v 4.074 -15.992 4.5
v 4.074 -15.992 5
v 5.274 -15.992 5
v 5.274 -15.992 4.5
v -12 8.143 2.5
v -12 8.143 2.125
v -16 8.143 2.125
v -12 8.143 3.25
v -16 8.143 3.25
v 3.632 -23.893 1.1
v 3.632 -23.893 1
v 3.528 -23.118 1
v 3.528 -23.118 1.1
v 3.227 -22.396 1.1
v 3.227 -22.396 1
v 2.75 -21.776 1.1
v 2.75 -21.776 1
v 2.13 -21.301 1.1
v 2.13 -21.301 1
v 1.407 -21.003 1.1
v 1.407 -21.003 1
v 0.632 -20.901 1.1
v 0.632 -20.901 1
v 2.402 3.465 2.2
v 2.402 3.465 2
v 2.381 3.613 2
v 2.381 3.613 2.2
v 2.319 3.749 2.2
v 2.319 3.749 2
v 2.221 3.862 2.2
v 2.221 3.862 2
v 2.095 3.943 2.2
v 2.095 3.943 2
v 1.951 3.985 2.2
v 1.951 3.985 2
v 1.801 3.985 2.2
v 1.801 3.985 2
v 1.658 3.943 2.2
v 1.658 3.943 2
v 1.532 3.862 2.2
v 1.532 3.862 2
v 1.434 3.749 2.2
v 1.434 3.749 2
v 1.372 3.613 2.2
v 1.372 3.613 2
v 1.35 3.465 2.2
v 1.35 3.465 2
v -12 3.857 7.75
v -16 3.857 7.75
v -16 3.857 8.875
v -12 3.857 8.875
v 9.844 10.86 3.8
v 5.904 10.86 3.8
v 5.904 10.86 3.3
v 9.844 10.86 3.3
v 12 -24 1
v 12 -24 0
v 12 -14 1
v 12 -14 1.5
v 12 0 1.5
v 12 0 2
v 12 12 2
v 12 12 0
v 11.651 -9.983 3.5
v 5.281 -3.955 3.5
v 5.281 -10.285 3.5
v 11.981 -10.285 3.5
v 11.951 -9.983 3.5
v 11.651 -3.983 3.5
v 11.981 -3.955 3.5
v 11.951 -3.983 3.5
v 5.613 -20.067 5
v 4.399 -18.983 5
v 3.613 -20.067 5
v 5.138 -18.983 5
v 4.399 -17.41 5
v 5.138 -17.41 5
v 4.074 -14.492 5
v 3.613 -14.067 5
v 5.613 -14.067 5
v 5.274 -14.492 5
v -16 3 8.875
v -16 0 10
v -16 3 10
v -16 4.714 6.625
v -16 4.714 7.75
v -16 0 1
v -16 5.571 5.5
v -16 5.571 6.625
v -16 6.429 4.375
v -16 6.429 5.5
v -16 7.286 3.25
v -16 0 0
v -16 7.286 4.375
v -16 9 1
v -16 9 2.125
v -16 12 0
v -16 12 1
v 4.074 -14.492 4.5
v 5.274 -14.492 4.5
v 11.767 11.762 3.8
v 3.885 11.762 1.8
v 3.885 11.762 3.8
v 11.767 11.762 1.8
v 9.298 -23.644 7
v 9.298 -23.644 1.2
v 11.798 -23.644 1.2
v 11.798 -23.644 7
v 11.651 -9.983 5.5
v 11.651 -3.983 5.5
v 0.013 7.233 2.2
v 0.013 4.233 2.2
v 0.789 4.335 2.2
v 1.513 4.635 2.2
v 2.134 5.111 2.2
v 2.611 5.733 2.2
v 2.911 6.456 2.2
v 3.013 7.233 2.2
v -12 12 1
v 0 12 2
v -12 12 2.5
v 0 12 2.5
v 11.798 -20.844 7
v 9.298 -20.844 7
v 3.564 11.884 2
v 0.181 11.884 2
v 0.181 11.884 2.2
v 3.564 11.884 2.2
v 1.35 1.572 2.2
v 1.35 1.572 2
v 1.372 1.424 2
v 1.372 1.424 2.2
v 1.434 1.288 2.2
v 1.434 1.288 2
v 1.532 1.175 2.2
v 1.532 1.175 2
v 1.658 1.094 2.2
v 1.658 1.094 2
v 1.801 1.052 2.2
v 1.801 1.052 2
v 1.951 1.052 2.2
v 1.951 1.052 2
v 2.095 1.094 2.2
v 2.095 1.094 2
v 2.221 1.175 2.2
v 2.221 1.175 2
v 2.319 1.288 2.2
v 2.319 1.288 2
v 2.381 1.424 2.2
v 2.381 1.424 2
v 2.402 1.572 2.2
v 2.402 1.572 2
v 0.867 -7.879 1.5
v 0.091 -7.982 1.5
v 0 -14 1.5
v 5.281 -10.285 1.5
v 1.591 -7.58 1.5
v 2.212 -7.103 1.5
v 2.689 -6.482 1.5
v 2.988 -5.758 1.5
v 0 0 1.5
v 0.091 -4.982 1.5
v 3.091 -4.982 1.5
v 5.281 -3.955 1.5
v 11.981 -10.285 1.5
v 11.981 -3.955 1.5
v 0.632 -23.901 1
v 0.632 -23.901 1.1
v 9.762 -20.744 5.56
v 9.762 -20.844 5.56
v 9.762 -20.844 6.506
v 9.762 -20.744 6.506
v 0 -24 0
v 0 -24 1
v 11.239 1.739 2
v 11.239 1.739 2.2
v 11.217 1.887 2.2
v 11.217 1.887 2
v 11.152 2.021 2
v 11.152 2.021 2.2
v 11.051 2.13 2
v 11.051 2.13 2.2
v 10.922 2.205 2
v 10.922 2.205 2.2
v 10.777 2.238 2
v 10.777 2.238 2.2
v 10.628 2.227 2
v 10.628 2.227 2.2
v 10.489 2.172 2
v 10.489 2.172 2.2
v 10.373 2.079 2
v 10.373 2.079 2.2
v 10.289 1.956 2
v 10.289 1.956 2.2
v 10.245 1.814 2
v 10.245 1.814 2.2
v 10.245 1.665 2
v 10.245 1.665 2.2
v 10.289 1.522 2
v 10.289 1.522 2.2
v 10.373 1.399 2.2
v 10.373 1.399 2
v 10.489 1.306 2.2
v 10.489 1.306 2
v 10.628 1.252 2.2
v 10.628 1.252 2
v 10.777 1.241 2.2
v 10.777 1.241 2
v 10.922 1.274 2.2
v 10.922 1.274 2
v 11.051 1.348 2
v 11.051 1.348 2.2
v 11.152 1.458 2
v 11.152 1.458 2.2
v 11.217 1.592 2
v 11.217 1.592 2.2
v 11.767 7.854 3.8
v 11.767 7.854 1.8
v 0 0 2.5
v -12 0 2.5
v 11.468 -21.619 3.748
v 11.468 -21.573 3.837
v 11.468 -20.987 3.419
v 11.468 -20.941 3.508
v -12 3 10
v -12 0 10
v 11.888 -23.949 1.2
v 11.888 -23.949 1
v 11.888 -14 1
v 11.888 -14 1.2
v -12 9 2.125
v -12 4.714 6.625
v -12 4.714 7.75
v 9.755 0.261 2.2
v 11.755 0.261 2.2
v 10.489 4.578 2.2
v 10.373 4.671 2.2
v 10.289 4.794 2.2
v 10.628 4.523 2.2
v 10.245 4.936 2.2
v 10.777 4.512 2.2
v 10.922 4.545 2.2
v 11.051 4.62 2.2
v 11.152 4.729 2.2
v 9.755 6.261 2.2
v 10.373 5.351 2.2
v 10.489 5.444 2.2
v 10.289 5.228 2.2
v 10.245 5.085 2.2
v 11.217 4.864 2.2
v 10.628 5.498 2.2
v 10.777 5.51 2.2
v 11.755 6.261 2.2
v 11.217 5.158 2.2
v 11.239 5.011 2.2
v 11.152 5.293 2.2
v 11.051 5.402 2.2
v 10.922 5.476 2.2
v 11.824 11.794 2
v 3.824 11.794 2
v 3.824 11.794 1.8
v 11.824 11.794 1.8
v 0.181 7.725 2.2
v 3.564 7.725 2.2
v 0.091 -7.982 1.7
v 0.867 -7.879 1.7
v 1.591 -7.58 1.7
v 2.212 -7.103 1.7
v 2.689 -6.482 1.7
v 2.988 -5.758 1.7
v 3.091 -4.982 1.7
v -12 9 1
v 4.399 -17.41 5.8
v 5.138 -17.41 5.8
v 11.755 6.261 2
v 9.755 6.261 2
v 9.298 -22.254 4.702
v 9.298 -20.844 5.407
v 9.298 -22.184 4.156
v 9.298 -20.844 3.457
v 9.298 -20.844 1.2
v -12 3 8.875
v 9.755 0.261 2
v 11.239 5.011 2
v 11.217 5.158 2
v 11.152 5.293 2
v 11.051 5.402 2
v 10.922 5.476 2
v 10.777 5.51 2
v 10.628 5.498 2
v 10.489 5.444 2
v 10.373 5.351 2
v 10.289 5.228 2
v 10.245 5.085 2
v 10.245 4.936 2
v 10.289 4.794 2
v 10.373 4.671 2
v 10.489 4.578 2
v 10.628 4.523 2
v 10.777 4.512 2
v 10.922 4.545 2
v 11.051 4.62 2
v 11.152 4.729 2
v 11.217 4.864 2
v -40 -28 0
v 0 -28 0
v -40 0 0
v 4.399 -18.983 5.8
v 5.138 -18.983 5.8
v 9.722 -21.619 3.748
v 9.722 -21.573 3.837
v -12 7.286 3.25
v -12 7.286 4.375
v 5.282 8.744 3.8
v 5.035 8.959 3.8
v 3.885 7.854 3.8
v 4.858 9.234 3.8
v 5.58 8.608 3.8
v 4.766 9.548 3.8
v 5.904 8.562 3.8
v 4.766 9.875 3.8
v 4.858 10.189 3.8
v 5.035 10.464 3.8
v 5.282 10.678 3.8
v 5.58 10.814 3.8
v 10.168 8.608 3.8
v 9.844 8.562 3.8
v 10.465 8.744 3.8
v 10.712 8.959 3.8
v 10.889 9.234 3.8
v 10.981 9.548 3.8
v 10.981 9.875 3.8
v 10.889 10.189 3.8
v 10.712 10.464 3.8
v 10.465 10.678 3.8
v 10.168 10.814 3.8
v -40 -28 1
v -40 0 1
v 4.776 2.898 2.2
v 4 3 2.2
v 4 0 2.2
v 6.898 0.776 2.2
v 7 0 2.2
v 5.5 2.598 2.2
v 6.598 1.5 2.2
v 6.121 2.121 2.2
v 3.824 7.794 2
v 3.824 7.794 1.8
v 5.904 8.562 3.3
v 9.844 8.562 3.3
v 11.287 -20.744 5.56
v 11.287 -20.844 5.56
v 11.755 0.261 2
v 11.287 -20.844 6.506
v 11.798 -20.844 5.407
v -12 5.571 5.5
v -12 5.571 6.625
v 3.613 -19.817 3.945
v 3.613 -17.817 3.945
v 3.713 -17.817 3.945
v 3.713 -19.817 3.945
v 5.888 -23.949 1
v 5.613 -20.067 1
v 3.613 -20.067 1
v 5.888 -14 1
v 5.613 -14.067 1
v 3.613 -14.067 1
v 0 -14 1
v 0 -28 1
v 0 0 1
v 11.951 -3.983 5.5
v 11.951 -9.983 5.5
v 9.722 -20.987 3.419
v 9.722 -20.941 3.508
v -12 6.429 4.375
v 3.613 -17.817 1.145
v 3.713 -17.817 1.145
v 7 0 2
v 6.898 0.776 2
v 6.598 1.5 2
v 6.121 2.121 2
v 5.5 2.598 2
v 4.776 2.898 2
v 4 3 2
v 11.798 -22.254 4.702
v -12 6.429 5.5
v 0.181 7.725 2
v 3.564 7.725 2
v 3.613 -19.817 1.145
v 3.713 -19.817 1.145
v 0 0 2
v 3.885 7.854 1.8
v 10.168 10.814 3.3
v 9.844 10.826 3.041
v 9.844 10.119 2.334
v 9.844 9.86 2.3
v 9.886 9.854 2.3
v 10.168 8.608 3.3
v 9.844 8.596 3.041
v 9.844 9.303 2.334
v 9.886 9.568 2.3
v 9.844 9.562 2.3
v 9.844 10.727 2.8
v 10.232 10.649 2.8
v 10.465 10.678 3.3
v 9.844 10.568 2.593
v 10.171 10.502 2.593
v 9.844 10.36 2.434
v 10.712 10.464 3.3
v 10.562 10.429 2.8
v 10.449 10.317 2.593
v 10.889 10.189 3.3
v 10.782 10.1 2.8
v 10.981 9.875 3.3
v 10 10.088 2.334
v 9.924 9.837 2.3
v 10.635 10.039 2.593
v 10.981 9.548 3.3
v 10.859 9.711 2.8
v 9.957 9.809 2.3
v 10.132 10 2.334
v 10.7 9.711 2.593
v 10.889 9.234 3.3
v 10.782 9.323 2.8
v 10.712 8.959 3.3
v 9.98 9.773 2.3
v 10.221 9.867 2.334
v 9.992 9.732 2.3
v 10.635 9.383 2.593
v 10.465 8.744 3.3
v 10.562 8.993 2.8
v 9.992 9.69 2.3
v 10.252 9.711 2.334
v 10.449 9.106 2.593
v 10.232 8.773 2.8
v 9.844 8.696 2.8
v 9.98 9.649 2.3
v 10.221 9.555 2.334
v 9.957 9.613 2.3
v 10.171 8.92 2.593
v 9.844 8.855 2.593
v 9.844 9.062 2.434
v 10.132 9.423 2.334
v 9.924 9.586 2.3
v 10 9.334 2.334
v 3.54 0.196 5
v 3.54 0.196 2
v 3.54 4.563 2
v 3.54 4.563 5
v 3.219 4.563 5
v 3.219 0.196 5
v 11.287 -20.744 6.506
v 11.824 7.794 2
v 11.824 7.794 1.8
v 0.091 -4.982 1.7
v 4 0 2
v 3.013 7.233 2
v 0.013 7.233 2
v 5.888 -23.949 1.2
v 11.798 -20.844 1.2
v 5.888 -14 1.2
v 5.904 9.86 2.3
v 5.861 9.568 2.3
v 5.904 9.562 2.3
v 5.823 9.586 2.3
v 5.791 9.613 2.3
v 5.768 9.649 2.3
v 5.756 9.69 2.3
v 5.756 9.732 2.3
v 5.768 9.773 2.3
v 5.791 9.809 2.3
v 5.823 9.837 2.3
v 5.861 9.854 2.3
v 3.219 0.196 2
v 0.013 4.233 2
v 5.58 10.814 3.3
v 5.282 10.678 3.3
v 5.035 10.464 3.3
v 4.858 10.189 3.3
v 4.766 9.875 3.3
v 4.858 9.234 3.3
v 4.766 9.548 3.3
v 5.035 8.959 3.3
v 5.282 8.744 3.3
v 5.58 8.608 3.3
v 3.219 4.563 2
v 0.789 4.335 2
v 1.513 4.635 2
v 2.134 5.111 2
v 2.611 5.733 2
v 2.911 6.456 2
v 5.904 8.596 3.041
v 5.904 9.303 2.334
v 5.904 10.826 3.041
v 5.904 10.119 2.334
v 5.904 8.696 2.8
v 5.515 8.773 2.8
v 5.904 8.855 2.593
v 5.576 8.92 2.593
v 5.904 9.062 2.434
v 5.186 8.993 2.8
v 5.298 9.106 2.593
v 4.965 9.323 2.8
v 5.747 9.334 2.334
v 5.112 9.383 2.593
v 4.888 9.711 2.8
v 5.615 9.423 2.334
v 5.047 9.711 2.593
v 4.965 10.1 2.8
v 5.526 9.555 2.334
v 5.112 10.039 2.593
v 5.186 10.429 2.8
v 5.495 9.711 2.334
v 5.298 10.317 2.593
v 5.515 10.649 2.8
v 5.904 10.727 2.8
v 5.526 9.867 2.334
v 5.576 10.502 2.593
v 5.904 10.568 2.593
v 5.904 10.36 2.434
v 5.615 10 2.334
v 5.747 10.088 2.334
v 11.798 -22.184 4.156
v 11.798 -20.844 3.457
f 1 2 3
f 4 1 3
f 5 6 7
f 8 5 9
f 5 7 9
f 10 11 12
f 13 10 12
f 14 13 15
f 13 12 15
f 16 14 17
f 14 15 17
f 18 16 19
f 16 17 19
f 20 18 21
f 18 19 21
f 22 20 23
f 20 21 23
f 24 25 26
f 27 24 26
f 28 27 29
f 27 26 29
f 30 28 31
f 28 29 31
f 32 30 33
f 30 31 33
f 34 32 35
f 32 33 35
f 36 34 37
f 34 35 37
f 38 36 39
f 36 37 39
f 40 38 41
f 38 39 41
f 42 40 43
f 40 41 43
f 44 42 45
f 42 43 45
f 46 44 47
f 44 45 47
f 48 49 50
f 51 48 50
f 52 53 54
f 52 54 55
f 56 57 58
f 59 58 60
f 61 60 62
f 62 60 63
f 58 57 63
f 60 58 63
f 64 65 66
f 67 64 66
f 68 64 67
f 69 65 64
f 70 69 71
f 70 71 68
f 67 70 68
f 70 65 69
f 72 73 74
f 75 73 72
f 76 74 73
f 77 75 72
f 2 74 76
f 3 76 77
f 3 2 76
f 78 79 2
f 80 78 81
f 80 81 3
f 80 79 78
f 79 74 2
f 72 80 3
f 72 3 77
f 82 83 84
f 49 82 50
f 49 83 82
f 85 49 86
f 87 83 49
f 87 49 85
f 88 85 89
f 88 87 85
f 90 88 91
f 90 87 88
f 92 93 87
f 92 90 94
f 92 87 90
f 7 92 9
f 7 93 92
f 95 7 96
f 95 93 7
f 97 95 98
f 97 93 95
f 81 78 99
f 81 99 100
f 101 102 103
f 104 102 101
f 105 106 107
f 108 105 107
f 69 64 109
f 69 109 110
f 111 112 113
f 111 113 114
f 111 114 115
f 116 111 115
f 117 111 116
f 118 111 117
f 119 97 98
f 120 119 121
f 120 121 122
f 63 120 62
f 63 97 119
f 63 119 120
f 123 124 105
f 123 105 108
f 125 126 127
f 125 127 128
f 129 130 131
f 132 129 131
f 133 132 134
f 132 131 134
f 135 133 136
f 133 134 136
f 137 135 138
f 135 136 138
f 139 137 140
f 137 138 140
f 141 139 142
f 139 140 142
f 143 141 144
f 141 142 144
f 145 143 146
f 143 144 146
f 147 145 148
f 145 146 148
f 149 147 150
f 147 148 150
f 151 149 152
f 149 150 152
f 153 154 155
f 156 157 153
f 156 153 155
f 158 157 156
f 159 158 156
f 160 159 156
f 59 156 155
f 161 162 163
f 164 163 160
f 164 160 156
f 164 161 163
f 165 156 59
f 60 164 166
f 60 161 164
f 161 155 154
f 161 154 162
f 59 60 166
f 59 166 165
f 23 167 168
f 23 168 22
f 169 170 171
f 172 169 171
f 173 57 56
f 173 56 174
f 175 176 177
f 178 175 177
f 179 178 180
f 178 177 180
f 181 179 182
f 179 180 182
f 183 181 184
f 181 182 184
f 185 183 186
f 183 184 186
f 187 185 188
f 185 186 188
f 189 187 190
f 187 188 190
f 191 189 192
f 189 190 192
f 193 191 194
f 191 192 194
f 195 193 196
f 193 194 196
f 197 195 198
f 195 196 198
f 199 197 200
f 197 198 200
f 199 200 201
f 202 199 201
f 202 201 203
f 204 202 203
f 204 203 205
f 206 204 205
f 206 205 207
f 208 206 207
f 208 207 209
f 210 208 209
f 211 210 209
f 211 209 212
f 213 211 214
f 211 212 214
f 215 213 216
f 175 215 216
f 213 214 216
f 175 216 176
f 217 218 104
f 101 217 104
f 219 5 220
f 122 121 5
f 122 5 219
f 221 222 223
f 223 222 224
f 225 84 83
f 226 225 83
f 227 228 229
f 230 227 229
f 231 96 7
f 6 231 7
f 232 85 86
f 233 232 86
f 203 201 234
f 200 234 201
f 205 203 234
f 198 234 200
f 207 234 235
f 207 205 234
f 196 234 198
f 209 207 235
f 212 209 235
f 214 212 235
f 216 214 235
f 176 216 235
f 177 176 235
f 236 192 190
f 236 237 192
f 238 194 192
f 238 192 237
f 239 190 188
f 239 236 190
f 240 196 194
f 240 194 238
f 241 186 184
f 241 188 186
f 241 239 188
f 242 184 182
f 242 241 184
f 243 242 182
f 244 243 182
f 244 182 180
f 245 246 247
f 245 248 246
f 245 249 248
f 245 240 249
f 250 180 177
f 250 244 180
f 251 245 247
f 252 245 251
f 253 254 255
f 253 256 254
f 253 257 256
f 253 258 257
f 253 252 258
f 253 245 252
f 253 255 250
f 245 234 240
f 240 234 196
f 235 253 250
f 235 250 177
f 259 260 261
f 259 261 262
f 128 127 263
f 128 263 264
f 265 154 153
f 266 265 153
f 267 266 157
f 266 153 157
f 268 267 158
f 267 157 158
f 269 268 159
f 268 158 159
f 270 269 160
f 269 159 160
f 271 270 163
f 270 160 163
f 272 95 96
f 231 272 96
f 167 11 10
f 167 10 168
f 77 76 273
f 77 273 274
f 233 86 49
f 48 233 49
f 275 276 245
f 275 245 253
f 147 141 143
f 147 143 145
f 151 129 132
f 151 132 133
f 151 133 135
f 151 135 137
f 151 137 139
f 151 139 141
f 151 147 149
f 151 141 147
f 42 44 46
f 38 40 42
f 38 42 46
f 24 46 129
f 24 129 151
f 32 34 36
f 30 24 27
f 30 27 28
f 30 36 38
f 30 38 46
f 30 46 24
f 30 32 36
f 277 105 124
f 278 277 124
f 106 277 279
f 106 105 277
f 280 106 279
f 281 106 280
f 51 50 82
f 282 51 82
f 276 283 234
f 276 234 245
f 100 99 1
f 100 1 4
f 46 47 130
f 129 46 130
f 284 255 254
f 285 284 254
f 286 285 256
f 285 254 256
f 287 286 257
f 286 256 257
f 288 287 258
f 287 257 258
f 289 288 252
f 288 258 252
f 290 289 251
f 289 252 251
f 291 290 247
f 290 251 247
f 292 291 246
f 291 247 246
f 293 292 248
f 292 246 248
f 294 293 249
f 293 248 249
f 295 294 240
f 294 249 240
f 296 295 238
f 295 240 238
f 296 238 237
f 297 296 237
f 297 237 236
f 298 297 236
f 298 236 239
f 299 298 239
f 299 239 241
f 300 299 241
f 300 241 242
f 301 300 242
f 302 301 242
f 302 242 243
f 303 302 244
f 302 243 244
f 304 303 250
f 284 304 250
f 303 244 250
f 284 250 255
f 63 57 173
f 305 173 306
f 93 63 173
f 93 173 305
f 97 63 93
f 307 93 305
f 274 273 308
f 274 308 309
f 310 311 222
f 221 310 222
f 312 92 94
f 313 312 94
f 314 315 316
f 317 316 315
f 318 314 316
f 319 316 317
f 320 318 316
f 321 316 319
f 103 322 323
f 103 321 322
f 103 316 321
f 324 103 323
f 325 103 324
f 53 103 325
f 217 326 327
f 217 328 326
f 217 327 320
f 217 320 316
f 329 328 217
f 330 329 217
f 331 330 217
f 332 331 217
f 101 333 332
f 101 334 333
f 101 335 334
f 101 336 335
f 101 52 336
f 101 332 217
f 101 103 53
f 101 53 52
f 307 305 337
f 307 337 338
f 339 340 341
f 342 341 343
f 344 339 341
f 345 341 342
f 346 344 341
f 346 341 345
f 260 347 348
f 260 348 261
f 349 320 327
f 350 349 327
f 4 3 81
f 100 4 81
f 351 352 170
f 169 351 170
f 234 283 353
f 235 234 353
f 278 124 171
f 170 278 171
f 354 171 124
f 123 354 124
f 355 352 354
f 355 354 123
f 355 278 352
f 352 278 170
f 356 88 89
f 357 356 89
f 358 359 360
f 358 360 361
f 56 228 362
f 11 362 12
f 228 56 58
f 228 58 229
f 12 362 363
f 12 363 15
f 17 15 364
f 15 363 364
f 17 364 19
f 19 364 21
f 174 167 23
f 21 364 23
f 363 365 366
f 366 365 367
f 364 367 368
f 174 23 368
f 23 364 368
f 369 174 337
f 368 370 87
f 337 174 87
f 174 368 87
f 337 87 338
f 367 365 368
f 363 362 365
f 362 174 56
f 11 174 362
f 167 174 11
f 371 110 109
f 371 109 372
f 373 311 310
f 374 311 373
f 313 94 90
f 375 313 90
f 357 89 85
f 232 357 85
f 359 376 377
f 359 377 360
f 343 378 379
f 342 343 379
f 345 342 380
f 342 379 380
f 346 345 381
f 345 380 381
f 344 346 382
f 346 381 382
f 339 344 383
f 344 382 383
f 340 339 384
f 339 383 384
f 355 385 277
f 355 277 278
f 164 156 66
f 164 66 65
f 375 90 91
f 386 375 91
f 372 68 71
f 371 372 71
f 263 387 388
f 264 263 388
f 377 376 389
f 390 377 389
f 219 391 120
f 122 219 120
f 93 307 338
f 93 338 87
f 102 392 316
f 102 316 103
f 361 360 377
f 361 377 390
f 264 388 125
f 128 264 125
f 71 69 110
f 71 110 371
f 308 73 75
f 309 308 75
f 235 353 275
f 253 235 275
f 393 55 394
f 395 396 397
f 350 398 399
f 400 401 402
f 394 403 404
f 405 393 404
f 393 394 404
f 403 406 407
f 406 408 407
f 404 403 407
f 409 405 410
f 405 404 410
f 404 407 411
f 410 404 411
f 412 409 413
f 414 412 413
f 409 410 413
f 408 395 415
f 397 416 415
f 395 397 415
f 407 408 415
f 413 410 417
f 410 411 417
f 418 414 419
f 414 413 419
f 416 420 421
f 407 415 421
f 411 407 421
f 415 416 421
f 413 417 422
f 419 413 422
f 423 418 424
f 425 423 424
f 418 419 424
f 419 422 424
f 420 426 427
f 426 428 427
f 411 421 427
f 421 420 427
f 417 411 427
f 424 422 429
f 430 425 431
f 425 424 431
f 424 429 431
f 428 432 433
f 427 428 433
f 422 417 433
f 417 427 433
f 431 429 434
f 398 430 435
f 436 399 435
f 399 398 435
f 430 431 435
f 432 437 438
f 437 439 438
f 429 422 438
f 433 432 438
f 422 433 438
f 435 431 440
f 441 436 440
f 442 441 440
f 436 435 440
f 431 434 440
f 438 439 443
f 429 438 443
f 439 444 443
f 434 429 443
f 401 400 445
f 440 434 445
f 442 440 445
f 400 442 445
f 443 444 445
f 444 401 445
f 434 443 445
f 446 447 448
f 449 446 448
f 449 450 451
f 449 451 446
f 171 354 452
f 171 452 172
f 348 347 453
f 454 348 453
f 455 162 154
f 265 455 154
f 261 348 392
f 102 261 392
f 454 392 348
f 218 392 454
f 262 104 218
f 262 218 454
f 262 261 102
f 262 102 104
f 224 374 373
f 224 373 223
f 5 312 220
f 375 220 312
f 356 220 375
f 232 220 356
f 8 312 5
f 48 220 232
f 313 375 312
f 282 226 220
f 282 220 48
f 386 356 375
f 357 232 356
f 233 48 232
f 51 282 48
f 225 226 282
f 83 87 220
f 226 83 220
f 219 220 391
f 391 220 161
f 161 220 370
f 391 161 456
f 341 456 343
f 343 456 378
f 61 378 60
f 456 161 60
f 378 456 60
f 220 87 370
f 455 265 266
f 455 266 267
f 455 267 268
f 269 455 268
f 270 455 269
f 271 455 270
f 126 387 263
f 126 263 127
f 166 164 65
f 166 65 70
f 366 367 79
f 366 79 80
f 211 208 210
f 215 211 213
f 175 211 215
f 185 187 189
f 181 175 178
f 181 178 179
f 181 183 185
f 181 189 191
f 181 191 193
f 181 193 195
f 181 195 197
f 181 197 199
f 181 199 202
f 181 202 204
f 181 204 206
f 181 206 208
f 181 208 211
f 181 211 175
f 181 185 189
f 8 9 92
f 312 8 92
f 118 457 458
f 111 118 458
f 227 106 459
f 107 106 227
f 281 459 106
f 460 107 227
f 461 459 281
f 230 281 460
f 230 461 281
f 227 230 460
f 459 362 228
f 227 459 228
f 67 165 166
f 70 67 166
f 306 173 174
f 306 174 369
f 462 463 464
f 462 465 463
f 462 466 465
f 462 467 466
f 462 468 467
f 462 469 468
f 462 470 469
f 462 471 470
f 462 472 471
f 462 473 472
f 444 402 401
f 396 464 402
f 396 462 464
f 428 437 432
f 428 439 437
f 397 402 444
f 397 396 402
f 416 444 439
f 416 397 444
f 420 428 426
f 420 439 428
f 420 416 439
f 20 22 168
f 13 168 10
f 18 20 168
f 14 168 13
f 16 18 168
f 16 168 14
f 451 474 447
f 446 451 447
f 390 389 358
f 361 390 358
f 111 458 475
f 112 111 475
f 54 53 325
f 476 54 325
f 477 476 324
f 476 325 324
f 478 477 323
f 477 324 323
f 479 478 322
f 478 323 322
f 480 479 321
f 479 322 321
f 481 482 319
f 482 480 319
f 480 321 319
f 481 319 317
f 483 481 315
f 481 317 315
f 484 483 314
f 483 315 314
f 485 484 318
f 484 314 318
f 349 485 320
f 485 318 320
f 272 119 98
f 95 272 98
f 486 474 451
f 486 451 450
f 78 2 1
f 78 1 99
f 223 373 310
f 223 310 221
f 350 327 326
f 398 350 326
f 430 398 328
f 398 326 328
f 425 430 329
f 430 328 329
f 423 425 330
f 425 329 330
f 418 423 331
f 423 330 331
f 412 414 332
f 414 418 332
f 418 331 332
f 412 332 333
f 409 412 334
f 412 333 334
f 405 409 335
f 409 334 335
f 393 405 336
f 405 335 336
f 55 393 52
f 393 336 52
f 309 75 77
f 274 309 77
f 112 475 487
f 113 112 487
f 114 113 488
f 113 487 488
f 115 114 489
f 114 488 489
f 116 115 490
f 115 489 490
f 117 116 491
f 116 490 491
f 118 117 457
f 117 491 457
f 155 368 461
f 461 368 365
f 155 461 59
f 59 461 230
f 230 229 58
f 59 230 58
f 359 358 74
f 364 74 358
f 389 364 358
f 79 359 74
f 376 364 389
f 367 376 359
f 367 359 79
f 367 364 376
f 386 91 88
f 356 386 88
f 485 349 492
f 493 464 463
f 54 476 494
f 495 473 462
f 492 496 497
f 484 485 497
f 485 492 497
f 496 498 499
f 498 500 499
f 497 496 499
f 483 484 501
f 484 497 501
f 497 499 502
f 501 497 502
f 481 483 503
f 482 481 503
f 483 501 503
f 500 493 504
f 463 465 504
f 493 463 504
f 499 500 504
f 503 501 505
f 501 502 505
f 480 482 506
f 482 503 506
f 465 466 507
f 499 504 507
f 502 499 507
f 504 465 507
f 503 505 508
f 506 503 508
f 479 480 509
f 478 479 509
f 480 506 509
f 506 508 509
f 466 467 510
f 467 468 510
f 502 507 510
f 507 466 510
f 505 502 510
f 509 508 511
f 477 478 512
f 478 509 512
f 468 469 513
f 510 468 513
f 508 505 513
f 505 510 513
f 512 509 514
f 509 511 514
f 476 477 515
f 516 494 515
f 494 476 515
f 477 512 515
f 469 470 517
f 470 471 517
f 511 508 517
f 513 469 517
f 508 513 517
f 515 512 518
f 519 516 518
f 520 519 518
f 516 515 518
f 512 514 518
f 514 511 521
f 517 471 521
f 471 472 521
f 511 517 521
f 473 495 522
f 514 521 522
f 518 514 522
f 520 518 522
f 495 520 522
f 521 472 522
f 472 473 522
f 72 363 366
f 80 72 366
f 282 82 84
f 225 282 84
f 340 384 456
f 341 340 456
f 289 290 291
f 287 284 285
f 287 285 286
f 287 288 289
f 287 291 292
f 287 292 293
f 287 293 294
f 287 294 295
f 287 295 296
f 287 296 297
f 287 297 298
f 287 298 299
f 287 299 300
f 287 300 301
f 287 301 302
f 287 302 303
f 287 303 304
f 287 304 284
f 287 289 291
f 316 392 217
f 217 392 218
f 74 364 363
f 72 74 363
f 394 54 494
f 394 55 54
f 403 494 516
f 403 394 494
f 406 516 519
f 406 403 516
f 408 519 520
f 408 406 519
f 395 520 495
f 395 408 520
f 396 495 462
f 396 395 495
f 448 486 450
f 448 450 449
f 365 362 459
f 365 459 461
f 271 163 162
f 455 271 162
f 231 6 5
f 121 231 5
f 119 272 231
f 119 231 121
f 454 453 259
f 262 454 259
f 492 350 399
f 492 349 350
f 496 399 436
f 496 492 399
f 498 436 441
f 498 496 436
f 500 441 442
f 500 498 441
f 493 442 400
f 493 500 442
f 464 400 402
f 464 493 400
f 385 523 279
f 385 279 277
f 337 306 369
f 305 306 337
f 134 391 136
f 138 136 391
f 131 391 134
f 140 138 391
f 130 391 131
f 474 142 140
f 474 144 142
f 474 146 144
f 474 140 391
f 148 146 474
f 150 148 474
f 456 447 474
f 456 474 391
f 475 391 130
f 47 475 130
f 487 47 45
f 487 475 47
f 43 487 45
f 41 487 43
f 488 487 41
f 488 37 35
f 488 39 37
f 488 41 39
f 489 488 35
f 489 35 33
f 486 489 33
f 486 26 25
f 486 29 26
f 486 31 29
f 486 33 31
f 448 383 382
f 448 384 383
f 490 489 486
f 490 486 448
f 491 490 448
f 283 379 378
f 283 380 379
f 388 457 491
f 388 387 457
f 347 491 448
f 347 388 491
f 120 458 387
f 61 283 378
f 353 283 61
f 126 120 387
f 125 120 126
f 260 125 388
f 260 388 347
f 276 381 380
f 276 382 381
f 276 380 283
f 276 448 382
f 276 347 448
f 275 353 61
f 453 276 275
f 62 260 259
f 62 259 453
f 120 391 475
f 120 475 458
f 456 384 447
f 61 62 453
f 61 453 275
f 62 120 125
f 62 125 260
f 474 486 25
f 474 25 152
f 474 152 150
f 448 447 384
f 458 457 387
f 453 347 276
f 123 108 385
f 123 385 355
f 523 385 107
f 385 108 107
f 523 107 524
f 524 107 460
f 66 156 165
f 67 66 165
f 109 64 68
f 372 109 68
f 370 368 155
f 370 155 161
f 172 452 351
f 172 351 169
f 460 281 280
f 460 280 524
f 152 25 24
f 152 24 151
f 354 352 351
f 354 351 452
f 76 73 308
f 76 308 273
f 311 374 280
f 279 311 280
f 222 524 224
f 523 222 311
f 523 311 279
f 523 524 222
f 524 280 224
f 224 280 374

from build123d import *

# Parameters (mm, degrees)
PAD_DEPTH       = 1
SKETCH001_W     = 12
SKETCH001_H     = 12
PAD001_DEPTH    = 1
SKETCH002_W     = 12
SKETCH002_H     = 14
PAD002_DEPTH    = 0.5
SKETCH003_W     = 12
SKETCH003_H     = 12
PAD003_DEPTH    = 1.5
PAD004_DEPTH    = 4
SKETCH005_W     = 8
SKETCH005_H     = 4
POCKET_DEPTH    = 0.2
PAD005_DEPTH    = 0.2
SKETCH007_W     = 2
SKETCH007_H     = 6
PAD006_DEPTH    = 0.2
SKETCH008_R     = 0.5
POCKET001_DEPTH = 0.2
SKETCH009_W     = 3.383523
SKETCH009_H     = 4.158913
PAD007_DEPTH    = 0.2
PAD008_DEPTH    = 0.2
SKETCH011_W     = 0.321104
SKETCH011_H     = 4.367
PAD009_DEPTH    = 3
PAD010_DEPTH    = 0.2
SKETCH013_W     = 2
SKETCH013_H     = 6
PAD011_DEPTH    = 4
SKETCH014_W     = 6
SKETCH014_H     = 10
PAD012_DEPTH    = 0.2
PAD013_DEPTH    = 0.2
SKETCH016_W     = 2.5
SKETCH016_H     = 2.8
PAD014_DEPTH    = 6
SKETCH018_W     = 1.2
SKETCH018_H     = 1.5
POCKET002_DEPTH = 0.5
SKETCH019_W     = 2
SKETCH019_H     = 2.8
POCKET003_DEPTH = 0.1
SKETCH020_W     = 0.738537
SKETCH020_H     = 1.573408
PAD015_DEPTH    = 0.8
SKETCH021_W     = 1.524805
SKETCH021_H     = 0.946431
PAD016_DEPTH    = 0.1
POCKET004_DEPTH = 5
SKETCH023_W     = 1.745958
SKETCH023_H     = 0.71265
POCKET005_DEPTH = 0.1
SKETCH024_W     = 6.7
SKETCH024_H     = 6.33
PAD017_DEPTH    = 2
SKETCH025_W     = 0.3
SKETCH025_H     = 6
PAD018_DEPTH    = 2
SKETCH026_W     = 7.882242
SKETCH026_H     = 3.90727
PAD019_DEPTH    = 2
POCKET006_DEPTH = 1.5
FILLET_R        = 1
PAD020_DEPTH    = 0.1


with BuildPart() as part:
    # Sketch → Pad (new body)
    with BuildSketch(Plane.XY):
        Polygon((0, -28), (-40, -28), (-40, 0), (-16, 0), (-16, 12), (12, 12), (12, -24), (0, -24), align=None)
    extrude(amount=PAD_DEPTH)

    # Sketch001 (on Face10 of Pad) → Pad001 (join)
    with BuildSketch(Plane.XY.offset(1)):
        with Locations((6, 6)):
            Rectangle(SKETCH001_W, SKETCH001_H)
    extrude(amount=PAD001_DEPTH)

    # Sketch002 (on Face5 of Pad001) → Pad002 (join)
    with BuildSketch(Plane.XY.offset(1)):
        with Locations((6, -7)):
            Rectangle(SKETCH002_W, SKETCH002_H)
    extrude(amount=PAD002_DEPTH)

    # Sketch003 (on Face5 of Pad002) → Pad003 (join)
    with BuildSketch(Plane.XY.offset(1)):
        with Locations((-6, 6)):
            Rectangle(SKETCH003_W, SKETCH003_H)
    extrude(amount=PAD003_DEPTH)

    # Sketch004 (on Face8 of Pad003) → Pad004 (join)
    with BuildSketch(Plane(origin=(-16, 0, 0), x_dir=(0, -1, 0), z_dir=(-1, 0, 0))):
        Polygon((-12, 0), (-12, 1), (-9, 1), (-9, 2.1249999998), (-8.1428571429, 2.1249999998), (-8.1428571429, 3.2499999997), (-7.2857142857, 3.2499999997), (-7.2857142857, 4.3749999997), (-6.4285714286, 4.3749999997), (-6.4285714286, 5.4999999997), (-5.5714285714, 5.4999999997), (-5.5714285714, 6.6249999997), (-4.7142857143, 6.6249999997), (-4.7142857143, 7.7499999998), (-3.8571428571, 7.7499999998), (-3.8571428571, 8.8749999999), (-3, 8.8749999999), (-3, 10), (0, 10), (0, 0), align=None)
    extrude(amount=-PAD004_DEPTH)

    # Sketch005 (on Face29 of Pad004) → Pocket (cut)
    with BuildSketch(Plane.XY.offset(2)):
        with Locations((7.8244701681, 9.794484)):
            Rectangle(SKETCH005_W, SKETCH005_H)
    extrude(amount=-POCKET_DEPTH, mode=Mode.SUBTRACT)

    # Sketch006 (on Face29 of Pocket) → Pad005 (join)
    with BuildSketch(Plane.XY.offset(2)):
        with BuildLine():
            ThreePointArc((7, 0), (6.1213203436, 2.1213203436), (4, 3))
            Line((4, 3), (4, 0))
            Line((4, 0), (7, 0))
        make_face()
    extrude(amount=PAD005_DEPTH)

    # Sketch007 (on Face29 of Pad005) → Pad006 (join)
    with BuildSketch(Plane.XY.offset(2)):
        with Locations((10.75453, 3.2614561845)):
            Rectangle(SKETCH007_W, SKETCH007_H)
    extrude(amount=PAD006_DEPTH)

    # Sketch008 (on Face58 of Pad006) → Pocket001 (cut)
    with BuildSketch(Plane.XY.offset(2.2)):
        with Locations((10.739349, 5.010931)):
            Circle(SKETCH008_R)
        with Locations((10.739349, 1.739257)):
            Circle(SKETCH008_R)
    extrude(amount=-POCKET001_DEPTH, mode=Mode.SUBTRACT)

    # Sketch009 (on Face29 of Pocket001) → Pad007 (join)
    with BuildSketch(Plane.XY.offset(2)):
        with Locations((1.8727195, 9.8045235)):
            Rectangle(SKETCH009_W, SKETCH009_H)
    extrude(amount=PAD007_DEPTH)

    # Sketch010 (on Face29 of Pad007) → Pad008 (join)
    with BuildSketch(Plane.XY.offset(2)):
        with BuildLine():
            ThreePointArc((2.40198, 3.464925), (1.876188, 3.990717), (1.350396, 3.464925))
            Line((1.350396, 3.464925), (1.350396, 1.572068))
            ThreePointArc((1.350396, 1.572068), (1.876188, 1.046276), (2.40198, 1.572068))
            Line((2.40198, 3.464925), (2.40198, 1.572068))
        make_face()
    extrude(amount=PAD008_DEPTH)

    # Sketch011 (on Face29 of Pad008) → Pad009 (join)
    with BuildSketch(Plane.XY.offset(2)):
        with Locations((3.379871, 2.379998)):
            Rectangle(SKETCH011_W, SKETCH011_H)
    extrude(amount=PAD009_DEPTH)

    # Sketch012 (on Face29 of Pad009) → Pad010 (join)
    with BuildSketch(Plane.XY.offset(2)):
        with BuildLine():
            ThreePointArc((0.0127659439, 4.2328060849), (2.1340862875, 5.1114857414), (3.0127659439, 7.2328060849))
            Line((3.0127659439, 7.2328060849), (0.0127659439, 7.2328060849))
            Line((0.0127659439, 7.2328060849), (0.0127659439, 4.2328060849))
        make_face()
    extrude(amount=PAD010_DEPTH)

    # Sketch013 (on Face5 of Pad010) → Pad011 (join)
    with BuildSketch(Plane.XY.offset(1)):
        with Locations((4.6129902875, -17.0670078745)):
            Rectangle(SKETCH013_W, SKETCH013_H)
    extrude(amount=PAD011_DEPTH)

    # Sketch014 (on Face5 of Pad011) → Pad012 (join)
    with BuildSketch(Plane.XY.offset(1)):
        with Locations((8.8879963878, -18.9493321845)):
            Rectangle(SKETCH014_W, SKETCH014_H)
    extrude(amount=PAD012_DEPTH)

    # Sketch015 (on Face29 of Pad012) → Pad013 (join)
    with BuildSketch(Plane.XY.offset(1.5)):
        with BuildLine():
            ThreePointArc((0.0906927099, -7.9815394859), (2.2120130535, -7.1028598295), (3.0906927099, -4.9815394859))
            Line((3.0906927099, -4.9815394859), (0.0906927099, -4.9815394859))
            Line((0.0906927099, -4.9815394859), (0.0906927099, -7.9815394859))
        make_face()
    extrude(amount=PAD013_DEPTH)

    # Sketch016 (on Face5 of Pad013) → Pad014 (join)
    with BuildSketch(Plane.XY.offset(1)):
        with Locations((10.5483907095, -22.2439987125)):
            Rectangle(SKETCH016_W, SKETCH016_H)
    extrude(amount=PAD014_DEPTH)

    # Sketch018 (on Face36 of Pad014) → Pocket002 (cut)
    with BuildSketch(Plane.XY.offset(5)):
        with Locations((4.6740733219, -15.2416696781)):
            Rectangle(SKETCH018_W, SKETCH018_H)
    extrude(amount=-POCKET002_DEPTH, mode=Mode.SUBTRACT)

    # Sketch019 (on Face21 of Pocket002) → Pocket003 (cut)
    with BuildSketch(Plane(origin=(3.6129902875, 0, 0), x_dir=(0, -1, 0), z_dir=(-1, 0, 0))):
        with Locations((18.8170917125, 2.5448113219)):
            Rectangle(SKETCH019_W, SKETCH019_H)
    extrude(amount=-POCKET003_DEPTH, mode=Mode.SUBTRACT)

    # Sketch020 (on Face36 of Pocket003) → Pad015 (join)
    with BuildSketch(Plane.XY.offset(5)):
        with Locations((4.7687005, -18.196731)):
            Rectangle(SKETCH020_W, SKETCH020_H)
    extrude(amount=PAD015_DEPTH)

    # Sketch021 (on Face44 of Pad015) → Pad016 (join)
    with BuildSketch(Plane(origin=(0, -20.8439987125, 0), x_dir=(-1, 0, 0), z_dir=(0, 1, 0))):
        with Locations((-10.5244535, 6.0330185)):
            Rectangle(SKETCH021_W, SKETCH021_H)
    extrude(amount=PAD016_DEPTH)

    # Sketch022 (on Face45 of Pad016) → Pocket004 (cut)
    with BuildSketch(Plane.YZ.offset(11.7983907095)):
        Polygon((-20.527332, 3.292079), (-22.183851, 4.155583), (-22.254341, 4.701882), (-20.527332, 5.565385), align=None)
    extrude(amount=-POCKET004_DEPTH, mode=Mode.SUBTRACT)

    # Sketch023 (on Face101 of Pocket004) → Pocket005 (cut)
    with BuildSketch(Plane(origin=(0, -3.0366433765, -5.8254014449), x_dir=(1, 0, 0), z_dir=(0, 0.4622433354, 0.8867531217))):
        with Locations((10.59525, -20.547228)):
            Rectangle(SKETCH023_W, SKETCH023_H)
    extrude(amount=-POCKET005_DEPTH, mode=Mode.SUBTRACT)

    # Sketch024 (on Face29 of Pocket005) → Pad017 (join)
    with BuildSketch(Plane.XY.offset(1.5)):
        with Locations((8.6312609088, -7.1204113075)):
            Rectangle(SKETCH024_W, SKETCH024_H)
    extrude(amount=PAD017_DEPTH)

    # Sketch025 (on Face110 of Pad017) → Pad018 (join)
    with BuildSketch(Plane.XY.offset(3.5)):
        with Locations((11.800813, -6.9834993219)):
            Rectangle(SKETCH025_W, SKETCH025_H)
    extrude(amount=PAD018_DEPTH)

    # Sketch026 (on Face120 of Pad018) → Pad019 (join)
    with BuildSketch(Plane.XY.offset(1.8)):
        with Locations((7.82612, 9.807974)):
            Rectangle(SKETCH026_W, SKETCH026_H)
    extrude(amount=PAD019_DEPTH)

    # Sketch027 (on Face144 of Pad019) → Pocket006 (cut)
    with BuildSketch(Plane.XY.offset(3.8)):
        with BuildLine():
            ThreePointArc((5.903537, 10.860499), (4.754228, 9.71119), (5.903537, 8.561881))
            Line((5.903537, 8.561881), (9.843761, 8.561881))
            ThreePointArc((9.843761, 8.561881), (10.99307, 9.71119), (9.843761, 10.860499))
            Line((5.903537, 10.860499), (9.843761, 10.860499))
        make_face()
    extrude(amount=-POCKET006_DEPTH, mode=Mode.SUBTRACT)

    # Fillet
    fillet_edges = [part.edges().sort_by_distance(p)[0] for p in [
        (7.873649, 10.860499, 2.3),
    ]]
    fillet(fillet_edges, radius=FILLET_R)

    # Sketch017 (on Face5 of Pad014) → Pad020 (join)
    with BuildSketch(Plane.XY.offset(1)):
        with BuildLine():
            ThreePointArc((3.6318966642, -23.8926850513), (2.7504200176, -21.7764964464), (0.6319071596, -20.9006205647))
            Line((0.6319071596, -23.9006205647), (0.6319071596, -20.9006205647))
            Line((3.6318966642, -23.8926850513), (0.6319071596, -23.9006205647))
        make_face()
    extrude(amount=PAD020_DEPTH)


solid = part.part
